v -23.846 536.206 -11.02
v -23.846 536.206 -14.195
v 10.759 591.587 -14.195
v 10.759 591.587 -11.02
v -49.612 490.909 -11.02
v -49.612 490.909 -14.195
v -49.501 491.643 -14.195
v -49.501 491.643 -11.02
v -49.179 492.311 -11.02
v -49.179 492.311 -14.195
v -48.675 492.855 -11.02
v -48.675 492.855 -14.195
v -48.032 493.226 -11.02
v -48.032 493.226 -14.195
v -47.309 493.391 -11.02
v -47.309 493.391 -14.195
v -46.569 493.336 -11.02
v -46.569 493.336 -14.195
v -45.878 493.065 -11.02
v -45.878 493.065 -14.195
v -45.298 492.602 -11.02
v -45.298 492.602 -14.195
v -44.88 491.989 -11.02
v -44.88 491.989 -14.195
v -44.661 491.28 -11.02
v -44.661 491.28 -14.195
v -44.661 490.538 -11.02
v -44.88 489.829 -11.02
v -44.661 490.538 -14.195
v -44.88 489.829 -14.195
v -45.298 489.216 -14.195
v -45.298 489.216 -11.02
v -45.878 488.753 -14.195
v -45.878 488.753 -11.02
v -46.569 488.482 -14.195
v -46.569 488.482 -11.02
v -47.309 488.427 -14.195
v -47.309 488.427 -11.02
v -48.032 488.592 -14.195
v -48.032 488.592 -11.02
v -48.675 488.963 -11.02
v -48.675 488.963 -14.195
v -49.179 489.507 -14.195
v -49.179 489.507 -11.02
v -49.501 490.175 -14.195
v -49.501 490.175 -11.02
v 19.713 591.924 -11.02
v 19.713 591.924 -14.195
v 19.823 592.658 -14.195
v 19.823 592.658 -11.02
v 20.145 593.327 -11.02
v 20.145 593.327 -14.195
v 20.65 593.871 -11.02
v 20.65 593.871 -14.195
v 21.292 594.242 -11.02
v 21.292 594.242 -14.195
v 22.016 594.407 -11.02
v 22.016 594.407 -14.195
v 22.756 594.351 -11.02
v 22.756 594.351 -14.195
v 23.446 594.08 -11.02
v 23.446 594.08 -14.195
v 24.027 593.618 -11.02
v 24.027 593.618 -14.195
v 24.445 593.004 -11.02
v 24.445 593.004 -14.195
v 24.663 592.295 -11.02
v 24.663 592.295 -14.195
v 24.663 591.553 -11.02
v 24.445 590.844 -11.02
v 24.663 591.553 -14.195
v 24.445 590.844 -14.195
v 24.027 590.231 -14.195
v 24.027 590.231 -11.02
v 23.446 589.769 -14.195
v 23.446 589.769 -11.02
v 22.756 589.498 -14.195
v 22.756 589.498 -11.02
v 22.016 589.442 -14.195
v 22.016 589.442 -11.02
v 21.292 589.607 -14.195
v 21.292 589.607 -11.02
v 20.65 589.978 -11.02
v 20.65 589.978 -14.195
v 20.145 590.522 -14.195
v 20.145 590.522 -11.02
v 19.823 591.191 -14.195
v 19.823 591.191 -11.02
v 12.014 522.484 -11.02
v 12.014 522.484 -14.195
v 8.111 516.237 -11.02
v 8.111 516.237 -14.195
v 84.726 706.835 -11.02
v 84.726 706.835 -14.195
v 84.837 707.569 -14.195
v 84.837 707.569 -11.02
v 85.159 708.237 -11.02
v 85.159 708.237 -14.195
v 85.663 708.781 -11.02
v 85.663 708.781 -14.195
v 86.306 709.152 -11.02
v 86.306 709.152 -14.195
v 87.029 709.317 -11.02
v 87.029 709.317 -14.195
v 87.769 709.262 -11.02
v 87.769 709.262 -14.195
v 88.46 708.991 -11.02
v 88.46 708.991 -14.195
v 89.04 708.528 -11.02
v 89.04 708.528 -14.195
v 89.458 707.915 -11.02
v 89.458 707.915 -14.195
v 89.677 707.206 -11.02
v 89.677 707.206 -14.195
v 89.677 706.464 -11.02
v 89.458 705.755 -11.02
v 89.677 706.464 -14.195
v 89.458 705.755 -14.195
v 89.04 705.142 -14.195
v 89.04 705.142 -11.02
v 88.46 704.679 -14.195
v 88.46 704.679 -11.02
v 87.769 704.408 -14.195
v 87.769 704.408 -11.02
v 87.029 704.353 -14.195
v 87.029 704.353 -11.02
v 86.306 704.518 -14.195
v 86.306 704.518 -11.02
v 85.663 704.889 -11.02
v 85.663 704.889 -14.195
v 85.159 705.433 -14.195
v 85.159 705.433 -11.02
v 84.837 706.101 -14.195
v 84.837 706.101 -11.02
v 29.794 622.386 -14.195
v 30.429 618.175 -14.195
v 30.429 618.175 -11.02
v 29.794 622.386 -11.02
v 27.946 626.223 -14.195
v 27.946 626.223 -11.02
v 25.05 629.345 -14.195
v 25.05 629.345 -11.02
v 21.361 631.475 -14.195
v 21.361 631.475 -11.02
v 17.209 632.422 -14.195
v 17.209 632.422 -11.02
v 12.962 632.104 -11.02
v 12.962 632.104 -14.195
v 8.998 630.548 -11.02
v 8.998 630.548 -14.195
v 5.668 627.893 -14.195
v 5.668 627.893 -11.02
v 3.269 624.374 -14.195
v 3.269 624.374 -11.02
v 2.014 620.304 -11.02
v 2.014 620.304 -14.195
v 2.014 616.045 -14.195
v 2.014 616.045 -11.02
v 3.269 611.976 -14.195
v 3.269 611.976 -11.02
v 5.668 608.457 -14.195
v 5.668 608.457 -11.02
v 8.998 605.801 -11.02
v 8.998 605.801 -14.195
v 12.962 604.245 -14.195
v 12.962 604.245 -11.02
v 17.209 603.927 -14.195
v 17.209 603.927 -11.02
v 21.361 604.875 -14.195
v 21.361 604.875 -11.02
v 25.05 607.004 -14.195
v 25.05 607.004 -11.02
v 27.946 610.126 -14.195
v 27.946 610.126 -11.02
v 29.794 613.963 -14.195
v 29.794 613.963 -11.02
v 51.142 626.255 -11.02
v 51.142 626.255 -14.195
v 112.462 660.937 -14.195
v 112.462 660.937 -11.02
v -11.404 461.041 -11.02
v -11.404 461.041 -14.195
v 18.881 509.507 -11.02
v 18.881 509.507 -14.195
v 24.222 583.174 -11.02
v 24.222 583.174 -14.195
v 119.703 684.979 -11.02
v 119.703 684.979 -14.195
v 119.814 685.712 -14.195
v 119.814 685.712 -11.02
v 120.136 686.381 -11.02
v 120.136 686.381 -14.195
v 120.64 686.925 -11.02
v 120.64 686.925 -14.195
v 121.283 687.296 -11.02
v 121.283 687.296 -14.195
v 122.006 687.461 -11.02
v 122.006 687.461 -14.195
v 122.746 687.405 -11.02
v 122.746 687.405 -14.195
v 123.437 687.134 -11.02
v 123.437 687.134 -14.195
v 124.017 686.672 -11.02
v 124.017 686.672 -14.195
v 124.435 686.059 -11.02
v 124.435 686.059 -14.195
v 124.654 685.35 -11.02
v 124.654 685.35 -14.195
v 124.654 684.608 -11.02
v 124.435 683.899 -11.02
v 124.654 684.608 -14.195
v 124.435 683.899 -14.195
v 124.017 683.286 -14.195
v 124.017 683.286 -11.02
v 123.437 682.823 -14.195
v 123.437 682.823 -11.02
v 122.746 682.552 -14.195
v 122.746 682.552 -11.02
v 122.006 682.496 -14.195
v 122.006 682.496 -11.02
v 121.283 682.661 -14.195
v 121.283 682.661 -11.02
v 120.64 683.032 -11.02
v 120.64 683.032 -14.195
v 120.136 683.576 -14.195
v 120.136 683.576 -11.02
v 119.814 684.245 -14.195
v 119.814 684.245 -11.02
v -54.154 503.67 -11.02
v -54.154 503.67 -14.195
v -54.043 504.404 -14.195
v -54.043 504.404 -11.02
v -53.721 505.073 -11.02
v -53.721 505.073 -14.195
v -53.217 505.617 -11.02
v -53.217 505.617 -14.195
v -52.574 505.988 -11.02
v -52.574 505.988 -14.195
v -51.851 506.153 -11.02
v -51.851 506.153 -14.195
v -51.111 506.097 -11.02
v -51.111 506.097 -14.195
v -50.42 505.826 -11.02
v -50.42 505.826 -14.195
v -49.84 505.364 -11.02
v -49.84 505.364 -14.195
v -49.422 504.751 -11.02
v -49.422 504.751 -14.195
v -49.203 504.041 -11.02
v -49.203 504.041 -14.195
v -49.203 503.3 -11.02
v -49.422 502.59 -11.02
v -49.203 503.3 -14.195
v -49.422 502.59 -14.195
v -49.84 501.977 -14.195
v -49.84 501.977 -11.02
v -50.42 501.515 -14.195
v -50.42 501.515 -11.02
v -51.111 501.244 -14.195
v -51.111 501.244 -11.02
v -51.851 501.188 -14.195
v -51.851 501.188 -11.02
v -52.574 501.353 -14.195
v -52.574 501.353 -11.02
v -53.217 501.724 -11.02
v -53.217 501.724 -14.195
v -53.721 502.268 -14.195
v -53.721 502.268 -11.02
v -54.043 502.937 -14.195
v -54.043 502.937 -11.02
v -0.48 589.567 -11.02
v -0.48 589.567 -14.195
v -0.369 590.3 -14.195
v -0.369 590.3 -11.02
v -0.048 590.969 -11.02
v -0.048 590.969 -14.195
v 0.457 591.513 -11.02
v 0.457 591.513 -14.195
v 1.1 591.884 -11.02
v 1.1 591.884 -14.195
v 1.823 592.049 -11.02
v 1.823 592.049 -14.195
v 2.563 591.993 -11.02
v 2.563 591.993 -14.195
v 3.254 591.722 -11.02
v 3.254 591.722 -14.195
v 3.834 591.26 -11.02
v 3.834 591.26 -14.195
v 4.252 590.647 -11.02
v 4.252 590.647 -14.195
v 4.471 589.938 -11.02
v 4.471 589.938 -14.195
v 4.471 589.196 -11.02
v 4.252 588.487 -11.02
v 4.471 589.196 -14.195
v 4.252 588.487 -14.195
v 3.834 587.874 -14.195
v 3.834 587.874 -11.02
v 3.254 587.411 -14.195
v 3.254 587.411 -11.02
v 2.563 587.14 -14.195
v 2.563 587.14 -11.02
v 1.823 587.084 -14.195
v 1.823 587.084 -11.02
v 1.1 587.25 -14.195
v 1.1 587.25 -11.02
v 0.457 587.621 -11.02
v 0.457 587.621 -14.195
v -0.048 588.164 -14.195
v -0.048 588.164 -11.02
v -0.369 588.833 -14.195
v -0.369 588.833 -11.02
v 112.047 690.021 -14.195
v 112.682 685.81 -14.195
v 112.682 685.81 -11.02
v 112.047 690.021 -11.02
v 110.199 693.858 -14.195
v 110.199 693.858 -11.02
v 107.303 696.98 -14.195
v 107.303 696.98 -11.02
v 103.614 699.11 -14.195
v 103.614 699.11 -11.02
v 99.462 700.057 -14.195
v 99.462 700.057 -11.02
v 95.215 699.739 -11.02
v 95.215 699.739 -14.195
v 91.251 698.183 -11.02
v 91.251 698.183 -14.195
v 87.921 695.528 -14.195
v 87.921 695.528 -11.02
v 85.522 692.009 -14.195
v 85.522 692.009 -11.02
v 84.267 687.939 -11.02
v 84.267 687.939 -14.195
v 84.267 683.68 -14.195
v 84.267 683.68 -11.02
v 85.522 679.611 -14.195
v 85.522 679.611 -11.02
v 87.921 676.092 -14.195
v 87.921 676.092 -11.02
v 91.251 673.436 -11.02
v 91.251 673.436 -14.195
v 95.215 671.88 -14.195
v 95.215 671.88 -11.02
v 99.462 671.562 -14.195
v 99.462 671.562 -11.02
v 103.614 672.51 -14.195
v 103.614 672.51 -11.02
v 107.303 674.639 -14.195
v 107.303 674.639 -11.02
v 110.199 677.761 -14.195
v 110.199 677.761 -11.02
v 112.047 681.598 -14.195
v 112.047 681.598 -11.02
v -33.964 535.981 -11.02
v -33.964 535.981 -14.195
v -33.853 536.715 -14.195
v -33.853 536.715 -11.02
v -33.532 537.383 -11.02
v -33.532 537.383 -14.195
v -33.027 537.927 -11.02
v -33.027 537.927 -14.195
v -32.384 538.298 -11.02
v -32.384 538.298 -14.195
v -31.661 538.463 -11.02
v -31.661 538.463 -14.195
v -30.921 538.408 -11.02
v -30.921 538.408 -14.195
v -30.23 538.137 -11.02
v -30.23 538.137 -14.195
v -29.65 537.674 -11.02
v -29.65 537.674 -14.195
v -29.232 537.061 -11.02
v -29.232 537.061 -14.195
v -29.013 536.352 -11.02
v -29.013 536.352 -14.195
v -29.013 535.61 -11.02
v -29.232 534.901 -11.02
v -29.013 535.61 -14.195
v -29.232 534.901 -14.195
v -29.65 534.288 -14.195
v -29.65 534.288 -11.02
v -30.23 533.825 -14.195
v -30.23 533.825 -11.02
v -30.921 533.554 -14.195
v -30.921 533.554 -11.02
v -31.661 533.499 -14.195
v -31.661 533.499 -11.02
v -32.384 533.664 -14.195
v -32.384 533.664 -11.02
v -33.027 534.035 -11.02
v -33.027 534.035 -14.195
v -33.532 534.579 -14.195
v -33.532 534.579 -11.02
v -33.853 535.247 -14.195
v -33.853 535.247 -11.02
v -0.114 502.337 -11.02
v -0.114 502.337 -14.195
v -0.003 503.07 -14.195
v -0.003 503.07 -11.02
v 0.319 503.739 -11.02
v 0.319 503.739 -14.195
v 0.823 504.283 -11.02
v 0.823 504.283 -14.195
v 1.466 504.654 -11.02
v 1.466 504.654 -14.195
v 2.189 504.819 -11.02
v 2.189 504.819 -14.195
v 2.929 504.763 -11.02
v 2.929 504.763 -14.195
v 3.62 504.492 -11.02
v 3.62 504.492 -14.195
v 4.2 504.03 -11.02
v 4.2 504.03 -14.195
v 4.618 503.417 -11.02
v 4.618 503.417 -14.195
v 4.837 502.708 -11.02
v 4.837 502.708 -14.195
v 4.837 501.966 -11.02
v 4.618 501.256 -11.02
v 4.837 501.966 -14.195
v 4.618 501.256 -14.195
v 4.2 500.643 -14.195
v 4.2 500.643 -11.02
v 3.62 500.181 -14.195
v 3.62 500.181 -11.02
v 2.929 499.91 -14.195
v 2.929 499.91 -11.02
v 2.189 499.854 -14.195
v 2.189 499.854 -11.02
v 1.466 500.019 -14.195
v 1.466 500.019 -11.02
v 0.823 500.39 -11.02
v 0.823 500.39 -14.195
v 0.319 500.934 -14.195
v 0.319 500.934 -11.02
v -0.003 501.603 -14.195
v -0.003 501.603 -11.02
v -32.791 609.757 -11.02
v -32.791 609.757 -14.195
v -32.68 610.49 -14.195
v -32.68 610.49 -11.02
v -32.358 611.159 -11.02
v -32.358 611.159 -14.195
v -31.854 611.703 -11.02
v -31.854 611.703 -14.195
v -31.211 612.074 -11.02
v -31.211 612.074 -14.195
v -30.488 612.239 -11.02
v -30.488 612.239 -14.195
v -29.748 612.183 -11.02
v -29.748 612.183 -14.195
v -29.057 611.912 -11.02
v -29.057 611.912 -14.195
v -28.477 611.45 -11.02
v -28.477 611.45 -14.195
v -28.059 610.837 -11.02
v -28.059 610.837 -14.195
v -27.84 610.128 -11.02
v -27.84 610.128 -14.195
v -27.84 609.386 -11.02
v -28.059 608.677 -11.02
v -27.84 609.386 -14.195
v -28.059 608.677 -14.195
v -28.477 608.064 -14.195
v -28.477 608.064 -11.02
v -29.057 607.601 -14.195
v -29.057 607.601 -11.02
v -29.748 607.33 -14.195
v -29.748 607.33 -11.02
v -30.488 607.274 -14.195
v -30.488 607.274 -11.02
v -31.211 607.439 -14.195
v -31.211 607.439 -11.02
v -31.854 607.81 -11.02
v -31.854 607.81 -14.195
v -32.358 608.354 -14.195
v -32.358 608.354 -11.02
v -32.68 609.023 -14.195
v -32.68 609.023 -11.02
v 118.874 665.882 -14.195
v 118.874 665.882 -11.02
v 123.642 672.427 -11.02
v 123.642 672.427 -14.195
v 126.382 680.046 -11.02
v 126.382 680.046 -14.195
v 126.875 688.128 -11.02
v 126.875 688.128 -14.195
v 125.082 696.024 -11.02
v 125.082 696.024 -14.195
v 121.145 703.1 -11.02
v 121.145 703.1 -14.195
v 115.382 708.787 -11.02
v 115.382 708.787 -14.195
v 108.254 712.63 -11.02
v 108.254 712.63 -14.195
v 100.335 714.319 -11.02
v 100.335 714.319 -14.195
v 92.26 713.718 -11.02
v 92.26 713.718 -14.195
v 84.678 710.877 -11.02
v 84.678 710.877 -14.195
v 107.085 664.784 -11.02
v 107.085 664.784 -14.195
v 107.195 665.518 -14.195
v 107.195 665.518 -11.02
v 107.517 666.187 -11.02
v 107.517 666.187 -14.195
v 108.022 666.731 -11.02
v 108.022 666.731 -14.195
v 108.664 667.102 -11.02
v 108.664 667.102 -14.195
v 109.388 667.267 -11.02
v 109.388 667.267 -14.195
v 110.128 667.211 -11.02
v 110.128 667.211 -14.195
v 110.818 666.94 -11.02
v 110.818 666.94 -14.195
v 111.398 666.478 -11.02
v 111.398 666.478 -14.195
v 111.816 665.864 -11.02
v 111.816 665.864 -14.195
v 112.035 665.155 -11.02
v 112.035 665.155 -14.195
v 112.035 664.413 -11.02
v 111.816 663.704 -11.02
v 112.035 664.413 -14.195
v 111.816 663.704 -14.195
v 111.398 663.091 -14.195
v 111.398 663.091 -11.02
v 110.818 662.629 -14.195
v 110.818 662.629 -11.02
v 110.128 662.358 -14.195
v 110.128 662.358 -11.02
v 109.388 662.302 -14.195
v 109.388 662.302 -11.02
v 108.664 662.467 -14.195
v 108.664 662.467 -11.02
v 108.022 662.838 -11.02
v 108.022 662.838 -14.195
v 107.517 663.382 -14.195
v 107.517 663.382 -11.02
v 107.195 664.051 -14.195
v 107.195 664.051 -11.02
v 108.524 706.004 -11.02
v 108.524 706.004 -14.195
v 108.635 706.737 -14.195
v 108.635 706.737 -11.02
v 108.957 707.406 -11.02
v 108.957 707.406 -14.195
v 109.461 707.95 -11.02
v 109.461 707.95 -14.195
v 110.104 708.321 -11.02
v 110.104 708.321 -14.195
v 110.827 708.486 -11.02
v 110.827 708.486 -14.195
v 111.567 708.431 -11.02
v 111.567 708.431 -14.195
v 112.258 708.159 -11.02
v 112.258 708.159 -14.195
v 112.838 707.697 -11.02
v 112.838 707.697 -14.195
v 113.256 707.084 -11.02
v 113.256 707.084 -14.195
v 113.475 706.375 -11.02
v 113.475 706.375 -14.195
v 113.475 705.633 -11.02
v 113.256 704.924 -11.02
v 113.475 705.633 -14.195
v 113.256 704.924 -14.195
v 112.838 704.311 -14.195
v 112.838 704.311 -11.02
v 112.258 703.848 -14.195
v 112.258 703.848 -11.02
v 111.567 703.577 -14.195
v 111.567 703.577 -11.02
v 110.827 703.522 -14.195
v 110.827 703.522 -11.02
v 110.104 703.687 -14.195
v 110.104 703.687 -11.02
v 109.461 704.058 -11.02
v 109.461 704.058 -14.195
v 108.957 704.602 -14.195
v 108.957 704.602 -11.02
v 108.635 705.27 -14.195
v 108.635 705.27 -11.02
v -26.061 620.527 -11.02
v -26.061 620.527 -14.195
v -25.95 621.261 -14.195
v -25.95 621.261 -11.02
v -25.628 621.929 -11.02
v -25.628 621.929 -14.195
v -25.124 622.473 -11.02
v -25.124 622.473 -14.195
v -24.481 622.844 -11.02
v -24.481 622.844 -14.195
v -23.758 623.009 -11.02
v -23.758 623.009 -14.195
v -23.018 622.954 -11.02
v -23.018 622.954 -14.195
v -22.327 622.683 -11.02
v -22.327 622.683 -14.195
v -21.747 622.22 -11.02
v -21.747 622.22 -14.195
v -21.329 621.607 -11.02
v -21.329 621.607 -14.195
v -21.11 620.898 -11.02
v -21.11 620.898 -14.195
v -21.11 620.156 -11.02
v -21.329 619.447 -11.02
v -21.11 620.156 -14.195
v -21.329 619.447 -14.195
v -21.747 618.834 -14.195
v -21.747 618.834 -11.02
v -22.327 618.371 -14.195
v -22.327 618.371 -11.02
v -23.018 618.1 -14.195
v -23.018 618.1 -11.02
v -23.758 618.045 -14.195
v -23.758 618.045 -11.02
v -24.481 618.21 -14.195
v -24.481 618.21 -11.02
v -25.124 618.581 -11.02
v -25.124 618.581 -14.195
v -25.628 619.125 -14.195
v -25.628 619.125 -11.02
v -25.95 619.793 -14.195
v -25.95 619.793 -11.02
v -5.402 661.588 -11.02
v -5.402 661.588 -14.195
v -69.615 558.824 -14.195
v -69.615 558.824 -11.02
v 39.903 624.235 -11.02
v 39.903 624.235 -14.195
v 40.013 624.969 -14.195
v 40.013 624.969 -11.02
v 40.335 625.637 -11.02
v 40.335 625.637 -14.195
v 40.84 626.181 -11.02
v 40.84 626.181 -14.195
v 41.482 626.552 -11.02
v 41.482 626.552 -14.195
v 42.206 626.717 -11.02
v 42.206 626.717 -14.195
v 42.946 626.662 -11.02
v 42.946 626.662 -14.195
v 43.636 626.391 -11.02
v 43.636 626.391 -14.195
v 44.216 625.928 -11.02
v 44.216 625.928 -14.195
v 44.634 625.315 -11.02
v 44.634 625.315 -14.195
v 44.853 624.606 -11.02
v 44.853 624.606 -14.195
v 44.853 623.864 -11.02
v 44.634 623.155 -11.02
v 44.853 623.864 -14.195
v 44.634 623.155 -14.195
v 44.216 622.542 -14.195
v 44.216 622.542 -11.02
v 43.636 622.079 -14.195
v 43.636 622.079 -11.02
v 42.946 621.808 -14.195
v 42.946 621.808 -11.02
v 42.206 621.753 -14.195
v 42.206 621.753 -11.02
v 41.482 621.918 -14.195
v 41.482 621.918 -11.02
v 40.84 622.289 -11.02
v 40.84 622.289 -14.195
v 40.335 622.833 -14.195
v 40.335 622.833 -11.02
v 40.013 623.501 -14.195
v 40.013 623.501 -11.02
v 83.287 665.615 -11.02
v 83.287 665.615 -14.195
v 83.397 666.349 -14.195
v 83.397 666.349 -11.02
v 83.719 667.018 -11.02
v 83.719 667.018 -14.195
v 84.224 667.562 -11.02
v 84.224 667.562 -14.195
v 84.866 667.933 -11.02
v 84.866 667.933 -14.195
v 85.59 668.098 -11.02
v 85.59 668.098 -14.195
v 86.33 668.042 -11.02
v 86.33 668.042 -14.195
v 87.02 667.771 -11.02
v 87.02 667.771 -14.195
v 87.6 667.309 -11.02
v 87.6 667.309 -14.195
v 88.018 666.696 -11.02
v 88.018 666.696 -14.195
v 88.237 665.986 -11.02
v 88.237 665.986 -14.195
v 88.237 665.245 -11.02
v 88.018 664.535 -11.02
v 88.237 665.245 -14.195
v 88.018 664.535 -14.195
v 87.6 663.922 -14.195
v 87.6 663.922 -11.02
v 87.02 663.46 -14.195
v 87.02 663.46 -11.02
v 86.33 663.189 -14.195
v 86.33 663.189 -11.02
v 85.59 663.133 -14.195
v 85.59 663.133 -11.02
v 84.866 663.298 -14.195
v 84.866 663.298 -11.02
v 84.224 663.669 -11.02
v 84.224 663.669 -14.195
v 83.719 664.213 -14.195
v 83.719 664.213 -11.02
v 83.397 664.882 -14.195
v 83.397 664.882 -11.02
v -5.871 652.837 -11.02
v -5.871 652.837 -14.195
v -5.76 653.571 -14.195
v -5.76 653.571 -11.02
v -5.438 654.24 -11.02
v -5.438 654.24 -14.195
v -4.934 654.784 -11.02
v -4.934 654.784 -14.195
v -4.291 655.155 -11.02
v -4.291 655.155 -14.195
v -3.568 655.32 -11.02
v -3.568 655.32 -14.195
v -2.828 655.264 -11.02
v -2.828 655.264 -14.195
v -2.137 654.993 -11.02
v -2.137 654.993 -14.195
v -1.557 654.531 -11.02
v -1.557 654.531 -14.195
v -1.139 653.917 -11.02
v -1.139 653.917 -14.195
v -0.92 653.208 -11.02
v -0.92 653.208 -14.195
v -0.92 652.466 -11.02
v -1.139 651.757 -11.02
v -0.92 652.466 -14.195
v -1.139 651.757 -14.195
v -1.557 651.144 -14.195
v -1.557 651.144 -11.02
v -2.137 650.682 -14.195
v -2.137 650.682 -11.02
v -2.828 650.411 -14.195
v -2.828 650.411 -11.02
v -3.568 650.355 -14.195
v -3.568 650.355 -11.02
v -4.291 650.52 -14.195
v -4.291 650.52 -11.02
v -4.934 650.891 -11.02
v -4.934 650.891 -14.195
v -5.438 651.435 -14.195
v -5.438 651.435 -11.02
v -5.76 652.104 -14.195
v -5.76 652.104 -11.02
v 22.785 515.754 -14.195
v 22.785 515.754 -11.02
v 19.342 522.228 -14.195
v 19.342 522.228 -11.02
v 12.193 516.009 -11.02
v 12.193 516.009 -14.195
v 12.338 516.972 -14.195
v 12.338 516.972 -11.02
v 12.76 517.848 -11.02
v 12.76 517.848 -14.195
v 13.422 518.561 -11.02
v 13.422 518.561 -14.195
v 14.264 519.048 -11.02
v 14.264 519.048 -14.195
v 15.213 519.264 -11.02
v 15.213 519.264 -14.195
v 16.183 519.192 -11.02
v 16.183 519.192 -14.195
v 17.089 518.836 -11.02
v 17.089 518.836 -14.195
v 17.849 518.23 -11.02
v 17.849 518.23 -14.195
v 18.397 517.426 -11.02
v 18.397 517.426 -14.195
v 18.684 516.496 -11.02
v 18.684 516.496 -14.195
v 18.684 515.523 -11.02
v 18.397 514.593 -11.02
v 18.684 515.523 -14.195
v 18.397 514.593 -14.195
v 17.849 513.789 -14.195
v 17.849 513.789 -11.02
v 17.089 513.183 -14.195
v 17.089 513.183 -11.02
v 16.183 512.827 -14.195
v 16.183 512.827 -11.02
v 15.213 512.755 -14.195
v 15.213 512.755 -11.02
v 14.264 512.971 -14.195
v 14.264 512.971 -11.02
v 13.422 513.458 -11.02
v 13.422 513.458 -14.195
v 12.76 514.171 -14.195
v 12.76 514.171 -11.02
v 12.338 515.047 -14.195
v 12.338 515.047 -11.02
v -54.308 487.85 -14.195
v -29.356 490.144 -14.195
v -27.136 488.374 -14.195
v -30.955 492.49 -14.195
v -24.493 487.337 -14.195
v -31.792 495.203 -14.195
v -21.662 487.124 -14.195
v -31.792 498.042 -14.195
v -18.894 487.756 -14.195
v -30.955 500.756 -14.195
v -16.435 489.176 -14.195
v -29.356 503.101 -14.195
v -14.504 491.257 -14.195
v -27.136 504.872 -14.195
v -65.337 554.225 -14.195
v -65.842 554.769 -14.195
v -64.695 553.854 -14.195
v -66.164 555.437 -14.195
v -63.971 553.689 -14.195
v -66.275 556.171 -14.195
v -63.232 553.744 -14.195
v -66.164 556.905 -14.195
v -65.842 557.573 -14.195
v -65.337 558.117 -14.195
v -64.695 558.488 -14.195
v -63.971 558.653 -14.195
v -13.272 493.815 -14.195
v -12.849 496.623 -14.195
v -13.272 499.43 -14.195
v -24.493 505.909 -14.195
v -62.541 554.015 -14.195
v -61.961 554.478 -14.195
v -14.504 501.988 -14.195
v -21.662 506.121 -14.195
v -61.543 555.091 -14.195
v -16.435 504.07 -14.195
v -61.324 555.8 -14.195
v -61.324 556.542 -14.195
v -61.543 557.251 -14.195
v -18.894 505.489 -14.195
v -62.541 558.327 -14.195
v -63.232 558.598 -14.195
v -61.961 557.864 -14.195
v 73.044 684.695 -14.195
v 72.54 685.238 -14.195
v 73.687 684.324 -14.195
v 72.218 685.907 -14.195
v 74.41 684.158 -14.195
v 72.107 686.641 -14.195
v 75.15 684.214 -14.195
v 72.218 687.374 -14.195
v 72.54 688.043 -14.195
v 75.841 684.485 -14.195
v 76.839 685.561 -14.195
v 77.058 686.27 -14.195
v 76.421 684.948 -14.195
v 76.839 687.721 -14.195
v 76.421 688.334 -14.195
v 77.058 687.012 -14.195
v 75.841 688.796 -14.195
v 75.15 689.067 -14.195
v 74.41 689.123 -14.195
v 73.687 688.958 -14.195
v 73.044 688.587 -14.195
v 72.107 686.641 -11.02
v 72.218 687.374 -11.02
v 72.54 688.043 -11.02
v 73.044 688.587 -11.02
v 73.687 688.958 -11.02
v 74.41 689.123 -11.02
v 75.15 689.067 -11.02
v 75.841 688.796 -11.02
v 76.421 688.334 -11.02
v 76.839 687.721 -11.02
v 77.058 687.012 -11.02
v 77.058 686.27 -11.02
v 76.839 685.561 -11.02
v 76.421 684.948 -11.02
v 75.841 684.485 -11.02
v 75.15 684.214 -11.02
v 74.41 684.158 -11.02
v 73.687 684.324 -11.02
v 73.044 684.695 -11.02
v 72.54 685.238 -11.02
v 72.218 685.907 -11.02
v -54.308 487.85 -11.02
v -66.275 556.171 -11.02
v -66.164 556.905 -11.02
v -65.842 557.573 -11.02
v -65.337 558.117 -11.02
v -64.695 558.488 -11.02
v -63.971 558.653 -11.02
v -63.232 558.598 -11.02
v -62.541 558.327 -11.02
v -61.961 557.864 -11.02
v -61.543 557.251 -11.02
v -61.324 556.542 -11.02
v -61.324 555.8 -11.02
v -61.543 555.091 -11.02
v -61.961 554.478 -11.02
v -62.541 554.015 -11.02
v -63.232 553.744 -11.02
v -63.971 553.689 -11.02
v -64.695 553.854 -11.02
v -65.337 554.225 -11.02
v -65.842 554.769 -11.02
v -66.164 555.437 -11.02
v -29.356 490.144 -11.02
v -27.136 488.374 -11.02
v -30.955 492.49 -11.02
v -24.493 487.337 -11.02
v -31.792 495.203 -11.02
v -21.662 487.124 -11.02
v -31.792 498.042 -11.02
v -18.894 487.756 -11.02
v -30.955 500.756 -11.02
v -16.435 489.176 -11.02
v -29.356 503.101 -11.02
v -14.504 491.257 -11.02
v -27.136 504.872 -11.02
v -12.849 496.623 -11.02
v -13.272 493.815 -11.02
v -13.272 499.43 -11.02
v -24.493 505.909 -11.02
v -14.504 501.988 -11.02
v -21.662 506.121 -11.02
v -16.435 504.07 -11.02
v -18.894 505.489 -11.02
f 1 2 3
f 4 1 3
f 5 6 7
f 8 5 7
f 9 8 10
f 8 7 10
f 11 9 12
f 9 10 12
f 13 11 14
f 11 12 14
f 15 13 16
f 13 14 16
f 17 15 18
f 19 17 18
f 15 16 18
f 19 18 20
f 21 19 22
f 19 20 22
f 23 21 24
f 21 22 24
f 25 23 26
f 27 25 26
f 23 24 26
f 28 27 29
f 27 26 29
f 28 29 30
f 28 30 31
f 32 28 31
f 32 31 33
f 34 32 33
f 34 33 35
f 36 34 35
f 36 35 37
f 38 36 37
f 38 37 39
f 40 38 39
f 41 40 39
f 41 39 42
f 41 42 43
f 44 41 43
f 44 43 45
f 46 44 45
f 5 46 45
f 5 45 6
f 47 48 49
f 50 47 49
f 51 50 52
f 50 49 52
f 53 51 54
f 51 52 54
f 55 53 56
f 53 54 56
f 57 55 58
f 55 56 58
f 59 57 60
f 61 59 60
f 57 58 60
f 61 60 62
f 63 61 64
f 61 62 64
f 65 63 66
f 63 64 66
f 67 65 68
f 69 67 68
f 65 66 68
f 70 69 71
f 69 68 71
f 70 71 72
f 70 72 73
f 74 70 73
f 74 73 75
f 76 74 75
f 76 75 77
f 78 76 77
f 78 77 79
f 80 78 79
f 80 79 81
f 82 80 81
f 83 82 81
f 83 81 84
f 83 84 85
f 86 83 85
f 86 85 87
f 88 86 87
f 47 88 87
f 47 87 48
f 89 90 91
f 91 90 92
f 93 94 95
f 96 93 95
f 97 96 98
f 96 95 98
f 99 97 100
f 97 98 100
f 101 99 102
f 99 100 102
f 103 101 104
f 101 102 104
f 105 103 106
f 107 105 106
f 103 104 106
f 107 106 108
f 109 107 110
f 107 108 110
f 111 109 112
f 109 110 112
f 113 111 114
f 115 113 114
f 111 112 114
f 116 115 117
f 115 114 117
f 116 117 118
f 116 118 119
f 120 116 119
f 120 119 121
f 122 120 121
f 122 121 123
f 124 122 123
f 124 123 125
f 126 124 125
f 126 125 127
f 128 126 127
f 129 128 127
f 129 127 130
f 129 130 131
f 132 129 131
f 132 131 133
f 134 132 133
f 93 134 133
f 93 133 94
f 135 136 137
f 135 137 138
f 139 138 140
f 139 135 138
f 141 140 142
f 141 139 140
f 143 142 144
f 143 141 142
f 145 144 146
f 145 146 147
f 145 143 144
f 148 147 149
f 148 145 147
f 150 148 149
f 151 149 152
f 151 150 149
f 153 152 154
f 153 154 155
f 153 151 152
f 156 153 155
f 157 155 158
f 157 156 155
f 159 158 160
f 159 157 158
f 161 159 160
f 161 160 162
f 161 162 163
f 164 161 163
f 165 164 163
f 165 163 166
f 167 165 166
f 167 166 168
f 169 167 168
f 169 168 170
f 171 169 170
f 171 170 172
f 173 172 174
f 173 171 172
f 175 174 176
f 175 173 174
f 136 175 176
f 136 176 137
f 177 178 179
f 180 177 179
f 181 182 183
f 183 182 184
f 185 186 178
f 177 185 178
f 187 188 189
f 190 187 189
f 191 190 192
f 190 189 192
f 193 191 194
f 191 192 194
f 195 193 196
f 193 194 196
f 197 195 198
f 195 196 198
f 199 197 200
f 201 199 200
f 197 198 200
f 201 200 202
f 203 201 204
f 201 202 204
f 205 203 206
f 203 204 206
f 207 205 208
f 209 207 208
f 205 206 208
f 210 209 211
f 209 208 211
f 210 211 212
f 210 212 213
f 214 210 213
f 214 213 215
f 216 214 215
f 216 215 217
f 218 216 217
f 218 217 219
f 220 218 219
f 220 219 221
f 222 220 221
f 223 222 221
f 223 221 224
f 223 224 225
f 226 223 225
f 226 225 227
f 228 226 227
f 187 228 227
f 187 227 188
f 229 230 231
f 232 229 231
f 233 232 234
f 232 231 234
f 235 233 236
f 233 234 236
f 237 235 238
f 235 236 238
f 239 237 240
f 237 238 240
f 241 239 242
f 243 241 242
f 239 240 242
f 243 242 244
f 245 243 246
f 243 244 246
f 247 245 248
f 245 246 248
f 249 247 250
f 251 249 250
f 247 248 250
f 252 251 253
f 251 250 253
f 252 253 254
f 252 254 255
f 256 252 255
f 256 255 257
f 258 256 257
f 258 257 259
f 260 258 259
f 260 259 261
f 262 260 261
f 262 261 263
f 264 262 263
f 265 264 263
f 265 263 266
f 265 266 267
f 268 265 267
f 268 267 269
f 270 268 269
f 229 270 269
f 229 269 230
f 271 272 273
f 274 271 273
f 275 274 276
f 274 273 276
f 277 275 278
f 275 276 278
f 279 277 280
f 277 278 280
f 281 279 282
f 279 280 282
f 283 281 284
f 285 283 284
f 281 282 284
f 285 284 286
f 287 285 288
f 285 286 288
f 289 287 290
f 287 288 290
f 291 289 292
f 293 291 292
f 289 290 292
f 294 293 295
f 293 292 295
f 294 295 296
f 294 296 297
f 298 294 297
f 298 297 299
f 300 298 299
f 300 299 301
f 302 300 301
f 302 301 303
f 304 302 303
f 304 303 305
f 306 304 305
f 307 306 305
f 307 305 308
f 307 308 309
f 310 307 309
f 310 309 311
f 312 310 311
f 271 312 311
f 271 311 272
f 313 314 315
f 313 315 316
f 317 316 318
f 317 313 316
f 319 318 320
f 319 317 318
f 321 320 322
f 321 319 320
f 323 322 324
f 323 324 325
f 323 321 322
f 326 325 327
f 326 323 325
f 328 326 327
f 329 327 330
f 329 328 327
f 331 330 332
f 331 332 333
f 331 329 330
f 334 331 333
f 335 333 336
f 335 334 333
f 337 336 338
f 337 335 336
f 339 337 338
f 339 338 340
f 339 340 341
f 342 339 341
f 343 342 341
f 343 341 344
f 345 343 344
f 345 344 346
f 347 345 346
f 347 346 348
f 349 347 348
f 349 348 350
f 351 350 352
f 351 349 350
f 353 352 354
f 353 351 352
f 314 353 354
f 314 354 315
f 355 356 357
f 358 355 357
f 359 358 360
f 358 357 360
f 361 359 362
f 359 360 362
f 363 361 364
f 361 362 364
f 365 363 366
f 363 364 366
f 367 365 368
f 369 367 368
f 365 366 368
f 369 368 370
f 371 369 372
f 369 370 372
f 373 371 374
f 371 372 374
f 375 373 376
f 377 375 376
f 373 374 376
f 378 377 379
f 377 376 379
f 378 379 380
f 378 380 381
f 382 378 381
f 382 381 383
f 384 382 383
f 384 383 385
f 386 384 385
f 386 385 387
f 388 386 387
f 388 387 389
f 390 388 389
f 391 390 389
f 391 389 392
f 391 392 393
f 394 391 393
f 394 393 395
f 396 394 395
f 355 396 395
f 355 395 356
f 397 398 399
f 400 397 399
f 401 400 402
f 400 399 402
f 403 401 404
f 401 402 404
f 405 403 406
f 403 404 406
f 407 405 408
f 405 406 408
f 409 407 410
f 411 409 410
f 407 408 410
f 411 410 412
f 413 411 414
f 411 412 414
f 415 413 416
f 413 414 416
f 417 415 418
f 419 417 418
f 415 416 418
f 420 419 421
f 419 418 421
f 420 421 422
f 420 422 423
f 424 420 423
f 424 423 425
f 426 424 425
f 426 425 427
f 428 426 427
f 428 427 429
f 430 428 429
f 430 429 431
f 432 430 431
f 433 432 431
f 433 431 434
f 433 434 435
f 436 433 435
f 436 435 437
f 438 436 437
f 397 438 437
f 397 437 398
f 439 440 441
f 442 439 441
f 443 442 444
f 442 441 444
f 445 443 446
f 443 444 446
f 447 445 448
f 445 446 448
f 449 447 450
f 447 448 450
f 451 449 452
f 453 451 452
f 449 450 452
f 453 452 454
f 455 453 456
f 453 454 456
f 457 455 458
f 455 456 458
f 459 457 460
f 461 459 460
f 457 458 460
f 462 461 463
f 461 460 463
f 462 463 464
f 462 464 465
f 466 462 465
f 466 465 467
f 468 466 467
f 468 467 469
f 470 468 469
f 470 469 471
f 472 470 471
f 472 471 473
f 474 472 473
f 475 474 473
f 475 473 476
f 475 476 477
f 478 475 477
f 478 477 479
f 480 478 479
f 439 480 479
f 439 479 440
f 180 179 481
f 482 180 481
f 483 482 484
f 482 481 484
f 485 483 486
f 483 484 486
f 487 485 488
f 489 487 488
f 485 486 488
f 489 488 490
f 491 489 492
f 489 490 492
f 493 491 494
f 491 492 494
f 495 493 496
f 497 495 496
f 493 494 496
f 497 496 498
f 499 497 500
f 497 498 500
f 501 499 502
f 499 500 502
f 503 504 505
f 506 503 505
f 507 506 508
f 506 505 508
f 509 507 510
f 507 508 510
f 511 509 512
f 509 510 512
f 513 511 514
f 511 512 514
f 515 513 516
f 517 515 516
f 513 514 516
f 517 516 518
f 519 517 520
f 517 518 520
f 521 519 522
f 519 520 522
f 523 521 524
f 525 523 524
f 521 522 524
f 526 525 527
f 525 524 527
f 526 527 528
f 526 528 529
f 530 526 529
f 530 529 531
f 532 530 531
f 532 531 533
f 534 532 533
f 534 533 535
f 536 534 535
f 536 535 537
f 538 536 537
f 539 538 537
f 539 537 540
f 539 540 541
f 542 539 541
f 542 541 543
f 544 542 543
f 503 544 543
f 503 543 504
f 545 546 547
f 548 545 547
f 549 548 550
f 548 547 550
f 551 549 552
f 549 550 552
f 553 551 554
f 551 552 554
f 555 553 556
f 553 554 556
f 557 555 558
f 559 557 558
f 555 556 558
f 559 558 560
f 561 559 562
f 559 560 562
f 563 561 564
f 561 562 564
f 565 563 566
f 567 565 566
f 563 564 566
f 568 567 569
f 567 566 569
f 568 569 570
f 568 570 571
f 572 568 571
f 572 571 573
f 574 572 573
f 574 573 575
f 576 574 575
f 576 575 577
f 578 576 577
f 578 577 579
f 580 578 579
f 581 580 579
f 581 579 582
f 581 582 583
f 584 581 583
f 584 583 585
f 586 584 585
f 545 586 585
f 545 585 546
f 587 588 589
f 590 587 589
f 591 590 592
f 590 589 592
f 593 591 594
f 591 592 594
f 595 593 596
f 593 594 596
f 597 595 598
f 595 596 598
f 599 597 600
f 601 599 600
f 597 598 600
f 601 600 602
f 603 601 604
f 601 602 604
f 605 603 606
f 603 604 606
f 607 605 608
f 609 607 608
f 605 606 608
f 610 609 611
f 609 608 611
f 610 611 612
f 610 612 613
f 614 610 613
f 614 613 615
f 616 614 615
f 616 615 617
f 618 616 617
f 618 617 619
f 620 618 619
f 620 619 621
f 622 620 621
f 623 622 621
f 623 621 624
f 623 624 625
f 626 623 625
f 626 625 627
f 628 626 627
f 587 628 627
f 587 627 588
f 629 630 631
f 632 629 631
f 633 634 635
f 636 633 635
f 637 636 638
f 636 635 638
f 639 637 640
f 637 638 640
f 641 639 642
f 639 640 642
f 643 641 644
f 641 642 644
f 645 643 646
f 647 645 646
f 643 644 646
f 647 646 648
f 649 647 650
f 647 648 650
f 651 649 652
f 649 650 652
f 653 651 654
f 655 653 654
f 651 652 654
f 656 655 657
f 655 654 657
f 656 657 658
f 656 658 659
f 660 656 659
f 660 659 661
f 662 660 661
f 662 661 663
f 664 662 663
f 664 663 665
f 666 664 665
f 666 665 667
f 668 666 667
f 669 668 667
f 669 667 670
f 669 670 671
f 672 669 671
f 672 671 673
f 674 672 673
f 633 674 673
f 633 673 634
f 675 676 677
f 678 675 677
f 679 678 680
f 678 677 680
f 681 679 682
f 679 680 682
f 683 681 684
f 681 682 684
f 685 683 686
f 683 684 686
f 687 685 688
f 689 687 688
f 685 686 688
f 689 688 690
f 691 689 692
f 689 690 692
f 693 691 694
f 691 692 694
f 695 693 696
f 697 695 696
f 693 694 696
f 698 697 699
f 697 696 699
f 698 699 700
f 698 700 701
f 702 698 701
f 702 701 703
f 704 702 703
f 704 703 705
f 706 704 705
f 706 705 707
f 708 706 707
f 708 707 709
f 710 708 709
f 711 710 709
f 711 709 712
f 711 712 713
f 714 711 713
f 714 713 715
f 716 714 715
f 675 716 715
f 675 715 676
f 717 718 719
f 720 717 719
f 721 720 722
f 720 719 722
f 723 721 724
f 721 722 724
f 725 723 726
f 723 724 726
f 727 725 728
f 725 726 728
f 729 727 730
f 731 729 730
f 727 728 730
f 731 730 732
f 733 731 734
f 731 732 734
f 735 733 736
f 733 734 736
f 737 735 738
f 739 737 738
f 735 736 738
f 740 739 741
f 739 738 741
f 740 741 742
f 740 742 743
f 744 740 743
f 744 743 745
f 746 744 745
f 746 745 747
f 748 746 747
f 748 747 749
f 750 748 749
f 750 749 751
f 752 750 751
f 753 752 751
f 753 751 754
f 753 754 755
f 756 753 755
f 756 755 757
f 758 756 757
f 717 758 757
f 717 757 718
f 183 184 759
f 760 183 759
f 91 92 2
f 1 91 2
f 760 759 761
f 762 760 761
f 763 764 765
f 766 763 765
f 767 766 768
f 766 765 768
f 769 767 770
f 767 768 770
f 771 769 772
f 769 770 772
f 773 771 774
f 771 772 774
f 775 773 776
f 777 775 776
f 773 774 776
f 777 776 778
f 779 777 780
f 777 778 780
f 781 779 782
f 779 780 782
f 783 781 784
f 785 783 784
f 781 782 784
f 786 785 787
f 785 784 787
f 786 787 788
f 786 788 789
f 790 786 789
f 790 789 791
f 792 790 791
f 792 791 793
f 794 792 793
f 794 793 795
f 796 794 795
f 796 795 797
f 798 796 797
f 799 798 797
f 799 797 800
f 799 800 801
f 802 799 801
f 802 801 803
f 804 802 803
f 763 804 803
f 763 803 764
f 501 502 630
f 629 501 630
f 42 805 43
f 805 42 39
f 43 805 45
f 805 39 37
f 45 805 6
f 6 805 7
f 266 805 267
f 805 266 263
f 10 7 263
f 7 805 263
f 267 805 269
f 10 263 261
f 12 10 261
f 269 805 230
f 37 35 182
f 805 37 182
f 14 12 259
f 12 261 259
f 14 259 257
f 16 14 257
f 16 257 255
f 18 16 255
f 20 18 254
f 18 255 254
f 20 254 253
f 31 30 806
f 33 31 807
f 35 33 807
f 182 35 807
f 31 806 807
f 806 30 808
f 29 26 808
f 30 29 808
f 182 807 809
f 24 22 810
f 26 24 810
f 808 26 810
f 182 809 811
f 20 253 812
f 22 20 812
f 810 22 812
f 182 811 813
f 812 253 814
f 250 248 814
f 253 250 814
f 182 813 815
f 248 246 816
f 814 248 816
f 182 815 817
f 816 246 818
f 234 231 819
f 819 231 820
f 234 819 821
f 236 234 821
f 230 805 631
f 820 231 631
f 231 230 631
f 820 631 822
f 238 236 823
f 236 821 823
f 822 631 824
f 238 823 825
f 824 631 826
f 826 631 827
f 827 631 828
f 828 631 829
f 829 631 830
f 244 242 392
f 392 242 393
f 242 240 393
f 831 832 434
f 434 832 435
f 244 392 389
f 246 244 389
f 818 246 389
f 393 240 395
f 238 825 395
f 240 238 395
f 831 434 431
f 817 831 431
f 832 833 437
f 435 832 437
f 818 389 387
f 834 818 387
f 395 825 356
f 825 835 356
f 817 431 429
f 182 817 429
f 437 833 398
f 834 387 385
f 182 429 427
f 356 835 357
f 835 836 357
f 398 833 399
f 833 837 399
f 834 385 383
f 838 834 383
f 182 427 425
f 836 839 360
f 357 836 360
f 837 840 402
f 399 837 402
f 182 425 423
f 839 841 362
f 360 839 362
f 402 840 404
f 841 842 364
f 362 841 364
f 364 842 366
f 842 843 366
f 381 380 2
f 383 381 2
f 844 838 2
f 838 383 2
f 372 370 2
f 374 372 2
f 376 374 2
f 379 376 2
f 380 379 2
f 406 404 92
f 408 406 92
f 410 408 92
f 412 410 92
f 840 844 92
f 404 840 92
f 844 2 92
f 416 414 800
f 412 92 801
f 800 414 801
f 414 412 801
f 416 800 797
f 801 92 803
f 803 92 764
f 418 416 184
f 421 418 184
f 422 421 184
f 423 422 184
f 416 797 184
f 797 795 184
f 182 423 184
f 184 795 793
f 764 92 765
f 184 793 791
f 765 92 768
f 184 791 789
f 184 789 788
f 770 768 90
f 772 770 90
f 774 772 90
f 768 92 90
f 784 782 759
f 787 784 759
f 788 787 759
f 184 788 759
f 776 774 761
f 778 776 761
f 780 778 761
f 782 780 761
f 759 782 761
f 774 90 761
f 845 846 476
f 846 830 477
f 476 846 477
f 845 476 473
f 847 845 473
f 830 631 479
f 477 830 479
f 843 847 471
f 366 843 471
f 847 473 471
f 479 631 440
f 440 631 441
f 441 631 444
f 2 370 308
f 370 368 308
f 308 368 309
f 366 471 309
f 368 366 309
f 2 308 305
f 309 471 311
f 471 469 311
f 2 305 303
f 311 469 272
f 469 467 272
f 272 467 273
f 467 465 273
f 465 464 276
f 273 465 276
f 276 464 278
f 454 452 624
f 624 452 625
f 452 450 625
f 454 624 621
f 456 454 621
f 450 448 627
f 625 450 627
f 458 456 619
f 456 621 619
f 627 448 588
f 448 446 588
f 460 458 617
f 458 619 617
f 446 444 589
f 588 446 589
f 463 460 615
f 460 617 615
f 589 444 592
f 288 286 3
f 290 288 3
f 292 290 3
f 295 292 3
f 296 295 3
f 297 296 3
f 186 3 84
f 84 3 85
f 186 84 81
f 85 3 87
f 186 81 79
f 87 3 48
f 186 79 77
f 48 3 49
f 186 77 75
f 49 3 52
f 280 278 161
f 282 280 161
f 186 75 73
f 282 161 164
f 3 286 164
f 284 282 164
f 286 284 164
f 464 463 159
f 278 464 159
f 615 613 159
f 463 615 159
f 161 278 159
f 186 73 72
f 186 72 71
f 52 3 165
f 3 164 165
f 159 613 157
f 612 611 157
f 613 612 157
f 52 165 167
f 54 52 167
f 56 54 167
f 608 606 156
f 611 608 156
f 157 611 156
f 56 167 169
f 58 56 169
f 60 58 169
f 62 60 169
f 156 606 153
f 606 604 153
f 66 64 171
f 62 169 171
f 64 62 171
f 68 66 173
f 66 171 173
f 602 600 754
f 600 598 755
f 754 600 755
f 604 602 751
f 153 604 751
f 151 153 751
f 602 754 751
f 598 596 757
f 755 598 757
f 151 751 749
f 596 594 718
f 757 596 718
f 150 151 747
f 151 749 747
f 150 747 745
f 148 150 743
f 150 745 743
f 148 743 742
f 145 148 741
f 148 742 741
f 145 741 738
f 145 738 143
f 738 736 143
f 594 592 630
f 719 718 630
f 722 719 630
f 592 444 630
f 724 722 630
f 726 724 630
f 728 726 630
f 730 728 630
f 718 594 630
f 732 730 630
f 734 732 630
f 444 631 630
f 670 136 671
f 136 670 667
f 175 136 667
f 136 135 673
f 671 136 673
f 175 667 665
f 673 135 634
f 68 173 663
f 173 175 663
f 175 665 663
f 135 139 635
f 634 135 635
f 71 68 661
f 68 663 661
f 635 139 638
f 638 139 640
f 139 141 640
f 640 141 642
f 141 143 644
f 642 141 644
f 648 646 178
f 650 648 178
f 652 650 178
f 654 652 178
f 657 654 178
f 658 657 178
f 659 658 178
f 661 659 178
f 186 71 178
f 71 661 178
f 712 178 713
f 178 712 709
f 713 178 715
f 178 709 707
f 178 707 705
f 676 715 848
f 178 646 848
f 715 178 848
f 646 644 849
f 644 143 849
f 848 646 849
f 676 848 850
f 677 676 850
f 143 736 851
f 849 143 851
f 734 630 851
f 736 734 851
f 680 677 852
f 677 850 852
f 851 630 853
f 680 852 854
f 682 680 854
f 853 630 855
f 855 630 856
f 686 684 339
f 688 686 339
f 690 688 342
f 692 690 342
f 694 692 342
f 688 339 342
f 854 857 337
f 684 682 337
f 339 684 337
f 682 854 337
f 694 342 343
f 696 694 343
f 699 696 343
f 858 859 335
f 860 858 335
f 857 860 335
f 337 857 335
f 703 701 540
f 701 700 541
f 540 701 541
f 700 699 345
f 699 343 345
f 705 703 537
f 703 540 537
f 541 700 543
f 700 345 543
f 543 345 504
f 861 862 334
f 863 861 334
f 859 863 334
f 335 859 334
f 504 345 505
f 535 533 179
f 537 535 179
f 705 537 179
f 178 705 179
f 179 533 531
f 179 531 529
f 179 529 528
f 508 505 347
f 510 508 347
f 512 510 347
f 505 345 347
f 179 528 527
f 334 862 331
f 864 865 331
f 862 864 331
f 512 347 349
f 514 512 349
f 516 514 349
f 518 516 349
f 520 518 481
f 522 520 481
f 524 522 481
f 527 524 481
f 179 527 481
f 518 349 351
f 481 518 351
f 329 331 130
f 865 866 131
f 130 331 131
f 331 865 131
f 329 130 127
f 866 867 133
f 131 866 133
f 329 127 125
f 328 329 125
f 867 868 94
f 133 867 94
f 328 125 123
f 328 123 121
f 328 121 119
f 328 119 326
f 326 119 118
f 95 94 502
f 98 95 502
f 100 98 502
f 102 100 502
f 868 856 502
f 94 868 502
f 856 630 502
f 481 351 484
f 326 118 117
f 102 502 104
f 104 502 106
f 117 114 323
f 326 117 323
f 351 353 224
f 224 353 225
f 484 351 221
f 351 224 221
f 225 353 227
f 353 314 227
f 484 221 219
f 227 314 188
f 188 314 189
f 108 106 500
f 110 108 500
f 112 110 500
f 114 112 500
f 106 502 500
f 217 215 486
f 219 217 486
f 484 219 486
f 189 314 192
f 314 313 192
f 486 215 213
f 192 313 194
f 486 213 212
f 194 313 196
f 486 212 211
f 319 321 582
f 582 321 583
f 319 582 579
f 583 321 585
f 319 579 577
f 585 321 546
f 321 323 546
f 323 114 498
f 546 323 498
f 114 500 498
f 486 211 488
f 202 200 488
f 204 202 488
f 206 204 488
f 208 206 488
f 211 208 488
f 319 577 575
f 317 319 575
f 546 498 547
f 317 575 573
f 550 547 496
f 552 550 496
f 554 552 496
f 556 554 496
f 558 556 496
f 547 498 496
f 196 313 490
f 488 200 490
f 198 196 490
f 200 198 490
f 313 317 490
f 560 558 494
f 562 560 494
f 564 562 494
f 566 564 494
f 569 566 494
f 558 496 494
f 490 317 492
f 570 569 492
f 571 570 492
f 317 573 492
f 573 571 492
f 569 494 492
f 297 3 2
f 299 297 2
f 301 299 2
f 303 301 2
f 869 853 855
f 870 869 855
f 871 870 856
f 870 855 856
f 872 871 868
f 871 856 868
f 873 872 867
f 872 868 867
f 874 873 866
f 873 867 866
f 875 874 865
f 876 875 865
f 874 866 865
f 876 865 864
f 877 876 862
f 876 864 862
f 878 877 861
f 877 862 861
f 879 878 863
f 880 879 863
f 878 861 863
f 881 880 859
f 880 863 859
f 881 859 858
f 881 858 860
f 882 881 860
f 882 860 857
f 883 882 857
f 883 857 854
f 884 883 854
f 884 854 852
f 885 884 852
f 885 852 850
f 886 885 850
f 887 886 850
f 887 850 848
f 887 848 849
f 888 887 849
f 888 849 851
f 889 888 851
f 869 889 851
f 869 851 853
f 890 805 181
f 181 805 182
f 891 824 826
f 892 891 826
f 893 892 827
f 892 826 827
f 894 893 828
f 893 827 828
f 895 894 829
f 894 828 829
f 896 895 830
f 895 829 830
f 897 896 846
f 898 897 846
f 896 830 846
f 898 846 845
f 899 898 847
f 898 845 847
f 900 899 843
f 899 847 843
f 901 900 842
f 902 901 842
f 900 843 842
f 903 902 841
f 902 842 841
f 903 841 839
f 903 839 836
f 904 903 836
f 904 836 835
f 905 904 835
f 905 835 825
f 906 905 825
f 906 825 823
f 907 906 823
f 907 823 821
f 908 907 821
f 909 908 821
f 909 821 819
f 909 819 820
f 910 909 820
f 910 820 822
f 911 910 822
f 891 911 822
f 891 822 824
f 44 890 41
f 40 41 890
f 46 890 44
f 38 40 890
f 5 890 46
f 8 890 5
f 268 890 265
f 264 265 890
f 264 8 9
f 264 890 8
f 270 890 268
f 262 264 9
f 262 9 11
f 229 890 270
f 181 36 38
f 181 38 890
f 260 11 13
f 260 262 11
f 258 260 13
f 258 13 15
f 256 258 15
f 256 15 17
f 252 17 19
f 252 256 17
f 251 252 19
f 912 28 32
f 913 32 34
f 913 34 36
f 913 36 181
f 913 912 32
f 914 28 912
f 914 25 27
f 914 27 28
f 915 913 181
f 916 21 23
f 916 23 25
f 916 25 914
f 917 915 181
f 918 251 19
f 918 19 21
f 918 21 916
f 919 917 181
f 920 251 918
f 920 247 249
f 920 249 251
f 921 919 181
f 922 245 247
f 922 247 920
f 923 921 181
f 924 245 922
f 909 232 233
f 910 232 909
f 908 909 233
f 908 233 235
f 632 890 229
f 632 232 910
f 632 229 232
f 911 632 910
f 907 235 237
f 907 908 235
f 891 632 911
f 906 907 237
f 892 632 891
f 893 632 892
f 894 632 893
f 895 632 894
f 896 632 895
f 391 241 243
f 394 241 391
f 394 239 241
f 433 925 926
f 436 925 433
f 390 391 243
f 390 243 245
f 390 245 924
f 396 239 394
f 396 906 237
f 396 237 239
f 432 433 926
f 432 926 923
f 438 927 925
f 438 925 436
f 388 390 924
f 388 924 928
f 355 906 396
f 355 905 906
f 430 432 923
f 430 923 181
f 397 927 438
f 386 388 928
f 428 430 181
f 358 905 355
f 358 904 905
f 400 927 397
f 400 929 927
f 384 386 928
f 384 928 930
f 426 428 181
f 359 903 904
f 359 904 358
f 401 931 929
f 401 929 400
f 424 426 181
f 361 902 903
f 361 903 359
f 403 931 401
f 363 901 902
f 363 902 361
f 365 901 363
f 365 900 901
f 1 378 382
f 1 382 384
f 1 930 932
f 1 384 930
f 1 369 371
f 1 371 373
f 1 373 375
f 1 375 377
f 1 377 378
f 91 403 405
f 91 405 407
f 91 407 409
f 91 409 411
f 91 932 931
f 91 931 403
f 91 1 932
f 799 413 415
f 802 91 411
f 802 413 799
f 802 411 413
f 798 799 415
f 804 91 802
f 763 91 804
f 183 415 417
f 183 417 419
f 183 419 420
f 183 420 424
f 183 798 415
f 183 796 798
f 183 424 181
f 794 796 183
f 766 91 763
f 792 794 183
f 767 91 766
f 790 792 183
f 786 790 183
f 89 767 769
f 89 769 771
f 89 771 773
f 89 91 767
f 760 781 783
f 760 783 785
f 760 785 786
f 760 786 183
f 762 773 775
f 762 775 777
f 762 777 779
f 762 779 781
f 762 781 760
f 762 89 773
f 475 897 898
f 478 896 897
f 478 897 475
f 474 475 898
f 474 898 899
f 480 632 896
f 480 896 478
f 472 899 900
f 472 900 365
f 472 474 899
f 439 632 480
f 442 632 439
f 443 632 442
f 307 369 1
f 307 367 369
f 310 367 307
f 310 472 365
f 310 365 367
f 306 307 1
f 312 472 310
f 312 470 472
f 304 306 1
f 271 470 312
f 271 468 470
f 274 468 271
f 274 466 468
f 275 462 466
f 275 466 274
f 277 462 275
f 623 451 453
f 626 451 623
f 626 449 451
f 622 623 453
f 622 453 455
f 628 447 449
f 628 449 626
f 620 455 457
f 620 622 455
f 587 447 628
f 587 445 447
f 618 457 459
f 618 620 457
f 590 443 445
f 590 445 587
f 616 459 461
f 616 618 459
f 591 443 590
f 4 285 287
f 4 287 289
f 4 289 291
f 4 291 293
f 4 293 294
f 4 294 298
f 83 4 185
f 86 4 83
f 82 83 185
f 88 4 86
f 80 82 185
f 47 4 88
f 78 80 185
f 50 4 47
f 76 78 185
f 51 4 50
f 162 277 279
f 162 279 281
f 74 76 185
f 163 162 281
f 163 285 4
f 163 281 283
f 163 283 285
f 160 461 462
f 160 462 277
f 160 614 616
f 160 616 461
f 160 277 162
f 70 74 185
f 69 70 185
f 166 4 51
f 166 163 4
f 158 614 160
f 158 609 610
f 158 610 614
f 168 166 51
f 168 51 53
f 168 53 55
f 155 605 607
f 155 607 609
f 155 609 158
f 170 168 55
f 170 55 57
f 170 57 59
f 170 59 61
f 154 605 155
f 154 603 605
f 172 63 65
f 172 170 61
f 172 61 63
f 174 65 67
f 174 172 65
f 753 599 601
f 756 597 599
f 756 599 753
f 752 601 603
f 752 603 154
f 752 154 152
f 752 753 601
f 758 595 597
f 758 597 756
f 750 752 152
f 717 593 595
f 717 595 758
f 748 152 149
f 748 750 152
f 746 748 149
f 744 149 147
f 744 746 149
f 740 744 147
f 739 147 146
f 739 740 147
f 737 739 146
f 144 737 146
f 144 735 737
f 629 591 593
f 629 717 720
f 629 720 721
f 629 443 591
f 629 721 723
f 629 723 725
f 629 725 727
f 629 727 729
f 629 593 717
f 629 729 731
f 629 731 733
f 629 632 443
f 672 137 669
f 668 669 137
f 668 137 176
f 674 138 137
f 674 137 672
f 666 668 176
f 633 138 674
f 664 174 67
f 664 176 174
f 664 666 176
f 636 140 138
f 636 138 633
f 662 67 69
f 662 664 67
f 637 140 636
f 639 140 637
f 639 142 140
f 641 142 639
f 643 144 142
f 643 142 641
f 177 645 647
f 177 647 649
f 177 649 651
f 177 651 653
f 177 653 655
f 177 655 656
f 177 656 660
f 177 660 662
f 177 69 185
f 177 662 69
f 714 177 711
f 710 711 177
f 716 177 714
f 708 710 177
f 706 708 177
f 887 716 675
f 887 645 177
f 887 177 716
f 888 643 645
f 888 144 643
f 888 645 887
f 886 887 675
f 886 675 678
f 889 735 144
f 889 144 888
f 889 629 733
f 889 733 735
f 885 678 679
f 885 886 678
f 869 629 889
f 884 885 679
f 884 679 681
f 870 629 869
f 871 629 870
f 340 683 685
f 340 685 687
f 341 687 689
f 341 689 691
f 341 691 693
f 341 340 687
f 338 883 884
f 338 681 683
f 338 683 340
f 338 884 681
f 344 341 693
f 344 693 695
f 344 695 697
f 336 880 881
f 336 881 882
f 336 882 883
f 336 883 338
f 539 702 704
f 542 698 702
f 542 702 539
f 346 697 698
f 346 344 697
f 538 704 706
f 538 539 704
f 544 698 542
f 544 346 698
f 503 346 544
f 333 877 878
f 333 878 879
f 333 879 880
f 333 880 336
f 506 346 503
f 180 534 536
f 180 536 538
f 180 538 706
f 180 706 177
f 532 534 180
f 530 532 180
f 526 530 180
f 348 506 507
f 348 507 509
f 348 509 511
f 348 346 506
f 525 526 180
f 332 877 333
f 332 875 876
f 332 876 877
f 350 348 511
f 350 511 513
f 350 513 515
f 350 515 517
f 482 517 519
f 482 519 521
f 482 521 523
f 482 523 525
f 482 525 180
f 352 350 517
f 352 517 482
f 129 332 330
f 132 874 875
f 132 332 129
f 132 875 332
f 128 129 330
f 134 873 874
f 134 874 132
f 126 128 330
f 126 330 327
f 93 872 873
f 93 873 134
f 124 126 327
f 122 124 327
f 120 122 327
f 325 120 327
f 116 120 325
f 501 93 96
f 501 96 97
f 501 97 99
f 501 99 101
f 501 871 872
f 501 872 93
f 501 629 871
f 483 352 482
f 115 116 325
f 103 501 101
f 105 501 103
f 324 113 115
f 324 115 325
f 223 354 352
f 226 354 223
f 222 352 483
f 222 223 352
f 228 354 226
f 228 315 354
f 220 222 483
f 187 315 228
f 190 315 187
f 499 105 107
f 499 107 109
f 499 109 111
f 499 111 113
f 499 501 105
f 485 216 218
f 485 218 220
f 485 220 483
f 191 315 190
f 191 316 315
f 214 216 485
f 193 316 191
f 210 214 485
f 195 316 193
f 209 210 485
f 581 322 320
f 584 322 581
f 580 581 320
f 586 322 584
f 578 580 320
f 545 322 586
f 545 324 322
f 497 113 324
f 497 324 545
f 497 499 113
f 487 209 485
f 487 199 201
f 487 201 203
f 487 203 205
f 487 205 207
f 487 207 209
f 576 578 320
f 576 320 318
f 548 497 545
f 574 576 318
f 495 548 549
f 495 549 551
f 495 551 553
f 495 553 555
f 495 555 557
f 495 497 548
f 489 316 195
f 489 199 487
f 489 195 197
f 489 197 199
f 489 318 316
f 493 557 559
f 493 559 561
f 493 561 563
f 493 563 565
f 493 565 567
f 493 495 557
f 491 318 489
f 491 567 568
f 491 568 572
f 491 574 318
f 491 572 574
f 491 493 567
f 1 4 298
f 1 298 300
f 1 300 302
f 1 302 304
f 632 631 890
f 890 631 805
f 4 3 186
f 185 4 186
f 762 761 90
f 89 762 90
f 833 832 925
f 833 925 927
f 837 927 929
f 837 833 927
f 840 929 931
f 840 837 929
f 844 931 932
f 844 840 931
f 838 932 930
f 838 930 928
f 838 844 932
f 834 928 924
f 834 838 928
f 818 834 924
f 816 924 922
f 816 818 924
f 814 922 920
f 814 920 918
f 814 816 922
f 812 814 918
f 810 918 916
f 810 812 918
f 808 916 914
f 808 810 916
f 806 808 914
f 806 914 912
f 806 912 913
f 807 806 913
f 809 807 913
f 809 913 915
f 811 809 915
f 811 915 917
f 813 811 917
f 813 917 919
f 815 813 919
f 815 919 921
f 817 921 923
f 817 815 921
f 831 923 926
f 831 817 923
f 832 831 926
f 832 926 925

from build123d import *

# Parameters (mm, degrees)
SKETCH1_R               = 14.2875
SKETCH1_R_2             = 9.525
BOSS_EXTRUDE1_DEPTH     = 3.175
F_10_CLEARANCE_HOLE2_D  = 4.9784
F_10_CLEARANCE_HOLE3_D  = 4.9784
F_1_4_CLEARANCE_HOLE1_D = 6.5278


with BuildPart() as part:
    # Sketch1 → Boss-Extrude1 (new body)
    with BuildSketch(Plane.XY.offset(-14.194599474)):
        with BuildLine():
            Line((-11.403602879, 461.040918113), (18.881283072, 509.506866808))
            Line((18.881283072, 509.506866808), (22.784668372, 515.753589084))
            Line((22.784668372, 515.753589084), (19.342339301, 522.227668471))
            Line((19.342339301, 522.227668471), (12.014457551, 522.48356374))
            Line((12.014457551, 522.48356374), (8.11107225, 516.236841464))
            Line((8.11107225, 516.236841464), (-23.846467356, 536.206128526))
            Line((-23.846467356, 536.206128526), (10.759214603, 591.586796266))
            Line((10.759214603, 591.586796266), (24.22197813, 583.174327946))
            Line((24.22197813, 583.174327946), (51.141876753, 626.255171231))
            Line((51.141876753, 626.255171231), (112.462044501, 660.93728694))
            ThreePointArc((112.462044501, 660.93728694), (123.365099157, 699.702028841), (84.677956887, 710.877306848))
            Line((84.677956887, 710.877306848), (-5.401730059, 661.587538174))
            Line((-5.401730059, 661.587538174), (-69.615486106, 558.824047132))
            Line((-69.615486106, 558.824047132), (-54.307899735, 487.850498283))
            Line((-54.307899735, 487.850498283), (-11.403602879, 461.040918113))
        make_face()
        with Locations((16.14150623, 618.174698631)):
            Circle(SKETCH1_R, mode=Mode.SUBTRACT)
        with Locations((-22.373657227, 496.622766323)):
            Circle(SKETCH1_R_2, mode=Mode.SUBTRACT)
        with Locations((98.394472266, 685.809641802)):
            Circle(SKETCH1_R, mode=Mode.SUBTRACT)
    extrude(amount=BOSS_EXTRUDE1_DEPTH)

    # #10 Clearance Hole2 (through all)
    with Locations(Plane.XY.offset(-11.019599474)):
        with Locations((2.375342418, 502.336523103), (-47.122656873, 490.909009542), (-3.381611976, 652.837445435), (42.391784014, 624.235053148), (22.201860047, 591.924420685), (-23.571535943, 620.526812972), (-31.474844299, 535.981130963), (-63.785476762, 556.17105493), (-51.664768266, 503.670498499), (2.009121865, 589.566678183), (-30.301510599, 609.756602151)):
            Hole(F_10_CLEARANCE_HOLE2_D / 2)

    # #10 Clearance Hole3 (through all)
    with Locations(Plane.XY.offset(-11.019599474)):
        with Locations((111.013174745, 706.003787092), (122.192466334, 684.978597537), (109.573763855, 664.784452247), (85.775769786, 665.615496512), (74.596478197, 686.640686067), (87.215180677, 706.834831357)):
            Hole(F_10_CLEARANCE_HOLE3_D / 2)

    # 1/4 Clearance Hole1 (through all)
    with Locations(Plane.XY.offset(-11.019599474)):
        with Locations((15.456786622, 516.009484354)):
            Hole(F_1_4_CLEARANCE_HOLE1_D / 2)


solid = part.part
